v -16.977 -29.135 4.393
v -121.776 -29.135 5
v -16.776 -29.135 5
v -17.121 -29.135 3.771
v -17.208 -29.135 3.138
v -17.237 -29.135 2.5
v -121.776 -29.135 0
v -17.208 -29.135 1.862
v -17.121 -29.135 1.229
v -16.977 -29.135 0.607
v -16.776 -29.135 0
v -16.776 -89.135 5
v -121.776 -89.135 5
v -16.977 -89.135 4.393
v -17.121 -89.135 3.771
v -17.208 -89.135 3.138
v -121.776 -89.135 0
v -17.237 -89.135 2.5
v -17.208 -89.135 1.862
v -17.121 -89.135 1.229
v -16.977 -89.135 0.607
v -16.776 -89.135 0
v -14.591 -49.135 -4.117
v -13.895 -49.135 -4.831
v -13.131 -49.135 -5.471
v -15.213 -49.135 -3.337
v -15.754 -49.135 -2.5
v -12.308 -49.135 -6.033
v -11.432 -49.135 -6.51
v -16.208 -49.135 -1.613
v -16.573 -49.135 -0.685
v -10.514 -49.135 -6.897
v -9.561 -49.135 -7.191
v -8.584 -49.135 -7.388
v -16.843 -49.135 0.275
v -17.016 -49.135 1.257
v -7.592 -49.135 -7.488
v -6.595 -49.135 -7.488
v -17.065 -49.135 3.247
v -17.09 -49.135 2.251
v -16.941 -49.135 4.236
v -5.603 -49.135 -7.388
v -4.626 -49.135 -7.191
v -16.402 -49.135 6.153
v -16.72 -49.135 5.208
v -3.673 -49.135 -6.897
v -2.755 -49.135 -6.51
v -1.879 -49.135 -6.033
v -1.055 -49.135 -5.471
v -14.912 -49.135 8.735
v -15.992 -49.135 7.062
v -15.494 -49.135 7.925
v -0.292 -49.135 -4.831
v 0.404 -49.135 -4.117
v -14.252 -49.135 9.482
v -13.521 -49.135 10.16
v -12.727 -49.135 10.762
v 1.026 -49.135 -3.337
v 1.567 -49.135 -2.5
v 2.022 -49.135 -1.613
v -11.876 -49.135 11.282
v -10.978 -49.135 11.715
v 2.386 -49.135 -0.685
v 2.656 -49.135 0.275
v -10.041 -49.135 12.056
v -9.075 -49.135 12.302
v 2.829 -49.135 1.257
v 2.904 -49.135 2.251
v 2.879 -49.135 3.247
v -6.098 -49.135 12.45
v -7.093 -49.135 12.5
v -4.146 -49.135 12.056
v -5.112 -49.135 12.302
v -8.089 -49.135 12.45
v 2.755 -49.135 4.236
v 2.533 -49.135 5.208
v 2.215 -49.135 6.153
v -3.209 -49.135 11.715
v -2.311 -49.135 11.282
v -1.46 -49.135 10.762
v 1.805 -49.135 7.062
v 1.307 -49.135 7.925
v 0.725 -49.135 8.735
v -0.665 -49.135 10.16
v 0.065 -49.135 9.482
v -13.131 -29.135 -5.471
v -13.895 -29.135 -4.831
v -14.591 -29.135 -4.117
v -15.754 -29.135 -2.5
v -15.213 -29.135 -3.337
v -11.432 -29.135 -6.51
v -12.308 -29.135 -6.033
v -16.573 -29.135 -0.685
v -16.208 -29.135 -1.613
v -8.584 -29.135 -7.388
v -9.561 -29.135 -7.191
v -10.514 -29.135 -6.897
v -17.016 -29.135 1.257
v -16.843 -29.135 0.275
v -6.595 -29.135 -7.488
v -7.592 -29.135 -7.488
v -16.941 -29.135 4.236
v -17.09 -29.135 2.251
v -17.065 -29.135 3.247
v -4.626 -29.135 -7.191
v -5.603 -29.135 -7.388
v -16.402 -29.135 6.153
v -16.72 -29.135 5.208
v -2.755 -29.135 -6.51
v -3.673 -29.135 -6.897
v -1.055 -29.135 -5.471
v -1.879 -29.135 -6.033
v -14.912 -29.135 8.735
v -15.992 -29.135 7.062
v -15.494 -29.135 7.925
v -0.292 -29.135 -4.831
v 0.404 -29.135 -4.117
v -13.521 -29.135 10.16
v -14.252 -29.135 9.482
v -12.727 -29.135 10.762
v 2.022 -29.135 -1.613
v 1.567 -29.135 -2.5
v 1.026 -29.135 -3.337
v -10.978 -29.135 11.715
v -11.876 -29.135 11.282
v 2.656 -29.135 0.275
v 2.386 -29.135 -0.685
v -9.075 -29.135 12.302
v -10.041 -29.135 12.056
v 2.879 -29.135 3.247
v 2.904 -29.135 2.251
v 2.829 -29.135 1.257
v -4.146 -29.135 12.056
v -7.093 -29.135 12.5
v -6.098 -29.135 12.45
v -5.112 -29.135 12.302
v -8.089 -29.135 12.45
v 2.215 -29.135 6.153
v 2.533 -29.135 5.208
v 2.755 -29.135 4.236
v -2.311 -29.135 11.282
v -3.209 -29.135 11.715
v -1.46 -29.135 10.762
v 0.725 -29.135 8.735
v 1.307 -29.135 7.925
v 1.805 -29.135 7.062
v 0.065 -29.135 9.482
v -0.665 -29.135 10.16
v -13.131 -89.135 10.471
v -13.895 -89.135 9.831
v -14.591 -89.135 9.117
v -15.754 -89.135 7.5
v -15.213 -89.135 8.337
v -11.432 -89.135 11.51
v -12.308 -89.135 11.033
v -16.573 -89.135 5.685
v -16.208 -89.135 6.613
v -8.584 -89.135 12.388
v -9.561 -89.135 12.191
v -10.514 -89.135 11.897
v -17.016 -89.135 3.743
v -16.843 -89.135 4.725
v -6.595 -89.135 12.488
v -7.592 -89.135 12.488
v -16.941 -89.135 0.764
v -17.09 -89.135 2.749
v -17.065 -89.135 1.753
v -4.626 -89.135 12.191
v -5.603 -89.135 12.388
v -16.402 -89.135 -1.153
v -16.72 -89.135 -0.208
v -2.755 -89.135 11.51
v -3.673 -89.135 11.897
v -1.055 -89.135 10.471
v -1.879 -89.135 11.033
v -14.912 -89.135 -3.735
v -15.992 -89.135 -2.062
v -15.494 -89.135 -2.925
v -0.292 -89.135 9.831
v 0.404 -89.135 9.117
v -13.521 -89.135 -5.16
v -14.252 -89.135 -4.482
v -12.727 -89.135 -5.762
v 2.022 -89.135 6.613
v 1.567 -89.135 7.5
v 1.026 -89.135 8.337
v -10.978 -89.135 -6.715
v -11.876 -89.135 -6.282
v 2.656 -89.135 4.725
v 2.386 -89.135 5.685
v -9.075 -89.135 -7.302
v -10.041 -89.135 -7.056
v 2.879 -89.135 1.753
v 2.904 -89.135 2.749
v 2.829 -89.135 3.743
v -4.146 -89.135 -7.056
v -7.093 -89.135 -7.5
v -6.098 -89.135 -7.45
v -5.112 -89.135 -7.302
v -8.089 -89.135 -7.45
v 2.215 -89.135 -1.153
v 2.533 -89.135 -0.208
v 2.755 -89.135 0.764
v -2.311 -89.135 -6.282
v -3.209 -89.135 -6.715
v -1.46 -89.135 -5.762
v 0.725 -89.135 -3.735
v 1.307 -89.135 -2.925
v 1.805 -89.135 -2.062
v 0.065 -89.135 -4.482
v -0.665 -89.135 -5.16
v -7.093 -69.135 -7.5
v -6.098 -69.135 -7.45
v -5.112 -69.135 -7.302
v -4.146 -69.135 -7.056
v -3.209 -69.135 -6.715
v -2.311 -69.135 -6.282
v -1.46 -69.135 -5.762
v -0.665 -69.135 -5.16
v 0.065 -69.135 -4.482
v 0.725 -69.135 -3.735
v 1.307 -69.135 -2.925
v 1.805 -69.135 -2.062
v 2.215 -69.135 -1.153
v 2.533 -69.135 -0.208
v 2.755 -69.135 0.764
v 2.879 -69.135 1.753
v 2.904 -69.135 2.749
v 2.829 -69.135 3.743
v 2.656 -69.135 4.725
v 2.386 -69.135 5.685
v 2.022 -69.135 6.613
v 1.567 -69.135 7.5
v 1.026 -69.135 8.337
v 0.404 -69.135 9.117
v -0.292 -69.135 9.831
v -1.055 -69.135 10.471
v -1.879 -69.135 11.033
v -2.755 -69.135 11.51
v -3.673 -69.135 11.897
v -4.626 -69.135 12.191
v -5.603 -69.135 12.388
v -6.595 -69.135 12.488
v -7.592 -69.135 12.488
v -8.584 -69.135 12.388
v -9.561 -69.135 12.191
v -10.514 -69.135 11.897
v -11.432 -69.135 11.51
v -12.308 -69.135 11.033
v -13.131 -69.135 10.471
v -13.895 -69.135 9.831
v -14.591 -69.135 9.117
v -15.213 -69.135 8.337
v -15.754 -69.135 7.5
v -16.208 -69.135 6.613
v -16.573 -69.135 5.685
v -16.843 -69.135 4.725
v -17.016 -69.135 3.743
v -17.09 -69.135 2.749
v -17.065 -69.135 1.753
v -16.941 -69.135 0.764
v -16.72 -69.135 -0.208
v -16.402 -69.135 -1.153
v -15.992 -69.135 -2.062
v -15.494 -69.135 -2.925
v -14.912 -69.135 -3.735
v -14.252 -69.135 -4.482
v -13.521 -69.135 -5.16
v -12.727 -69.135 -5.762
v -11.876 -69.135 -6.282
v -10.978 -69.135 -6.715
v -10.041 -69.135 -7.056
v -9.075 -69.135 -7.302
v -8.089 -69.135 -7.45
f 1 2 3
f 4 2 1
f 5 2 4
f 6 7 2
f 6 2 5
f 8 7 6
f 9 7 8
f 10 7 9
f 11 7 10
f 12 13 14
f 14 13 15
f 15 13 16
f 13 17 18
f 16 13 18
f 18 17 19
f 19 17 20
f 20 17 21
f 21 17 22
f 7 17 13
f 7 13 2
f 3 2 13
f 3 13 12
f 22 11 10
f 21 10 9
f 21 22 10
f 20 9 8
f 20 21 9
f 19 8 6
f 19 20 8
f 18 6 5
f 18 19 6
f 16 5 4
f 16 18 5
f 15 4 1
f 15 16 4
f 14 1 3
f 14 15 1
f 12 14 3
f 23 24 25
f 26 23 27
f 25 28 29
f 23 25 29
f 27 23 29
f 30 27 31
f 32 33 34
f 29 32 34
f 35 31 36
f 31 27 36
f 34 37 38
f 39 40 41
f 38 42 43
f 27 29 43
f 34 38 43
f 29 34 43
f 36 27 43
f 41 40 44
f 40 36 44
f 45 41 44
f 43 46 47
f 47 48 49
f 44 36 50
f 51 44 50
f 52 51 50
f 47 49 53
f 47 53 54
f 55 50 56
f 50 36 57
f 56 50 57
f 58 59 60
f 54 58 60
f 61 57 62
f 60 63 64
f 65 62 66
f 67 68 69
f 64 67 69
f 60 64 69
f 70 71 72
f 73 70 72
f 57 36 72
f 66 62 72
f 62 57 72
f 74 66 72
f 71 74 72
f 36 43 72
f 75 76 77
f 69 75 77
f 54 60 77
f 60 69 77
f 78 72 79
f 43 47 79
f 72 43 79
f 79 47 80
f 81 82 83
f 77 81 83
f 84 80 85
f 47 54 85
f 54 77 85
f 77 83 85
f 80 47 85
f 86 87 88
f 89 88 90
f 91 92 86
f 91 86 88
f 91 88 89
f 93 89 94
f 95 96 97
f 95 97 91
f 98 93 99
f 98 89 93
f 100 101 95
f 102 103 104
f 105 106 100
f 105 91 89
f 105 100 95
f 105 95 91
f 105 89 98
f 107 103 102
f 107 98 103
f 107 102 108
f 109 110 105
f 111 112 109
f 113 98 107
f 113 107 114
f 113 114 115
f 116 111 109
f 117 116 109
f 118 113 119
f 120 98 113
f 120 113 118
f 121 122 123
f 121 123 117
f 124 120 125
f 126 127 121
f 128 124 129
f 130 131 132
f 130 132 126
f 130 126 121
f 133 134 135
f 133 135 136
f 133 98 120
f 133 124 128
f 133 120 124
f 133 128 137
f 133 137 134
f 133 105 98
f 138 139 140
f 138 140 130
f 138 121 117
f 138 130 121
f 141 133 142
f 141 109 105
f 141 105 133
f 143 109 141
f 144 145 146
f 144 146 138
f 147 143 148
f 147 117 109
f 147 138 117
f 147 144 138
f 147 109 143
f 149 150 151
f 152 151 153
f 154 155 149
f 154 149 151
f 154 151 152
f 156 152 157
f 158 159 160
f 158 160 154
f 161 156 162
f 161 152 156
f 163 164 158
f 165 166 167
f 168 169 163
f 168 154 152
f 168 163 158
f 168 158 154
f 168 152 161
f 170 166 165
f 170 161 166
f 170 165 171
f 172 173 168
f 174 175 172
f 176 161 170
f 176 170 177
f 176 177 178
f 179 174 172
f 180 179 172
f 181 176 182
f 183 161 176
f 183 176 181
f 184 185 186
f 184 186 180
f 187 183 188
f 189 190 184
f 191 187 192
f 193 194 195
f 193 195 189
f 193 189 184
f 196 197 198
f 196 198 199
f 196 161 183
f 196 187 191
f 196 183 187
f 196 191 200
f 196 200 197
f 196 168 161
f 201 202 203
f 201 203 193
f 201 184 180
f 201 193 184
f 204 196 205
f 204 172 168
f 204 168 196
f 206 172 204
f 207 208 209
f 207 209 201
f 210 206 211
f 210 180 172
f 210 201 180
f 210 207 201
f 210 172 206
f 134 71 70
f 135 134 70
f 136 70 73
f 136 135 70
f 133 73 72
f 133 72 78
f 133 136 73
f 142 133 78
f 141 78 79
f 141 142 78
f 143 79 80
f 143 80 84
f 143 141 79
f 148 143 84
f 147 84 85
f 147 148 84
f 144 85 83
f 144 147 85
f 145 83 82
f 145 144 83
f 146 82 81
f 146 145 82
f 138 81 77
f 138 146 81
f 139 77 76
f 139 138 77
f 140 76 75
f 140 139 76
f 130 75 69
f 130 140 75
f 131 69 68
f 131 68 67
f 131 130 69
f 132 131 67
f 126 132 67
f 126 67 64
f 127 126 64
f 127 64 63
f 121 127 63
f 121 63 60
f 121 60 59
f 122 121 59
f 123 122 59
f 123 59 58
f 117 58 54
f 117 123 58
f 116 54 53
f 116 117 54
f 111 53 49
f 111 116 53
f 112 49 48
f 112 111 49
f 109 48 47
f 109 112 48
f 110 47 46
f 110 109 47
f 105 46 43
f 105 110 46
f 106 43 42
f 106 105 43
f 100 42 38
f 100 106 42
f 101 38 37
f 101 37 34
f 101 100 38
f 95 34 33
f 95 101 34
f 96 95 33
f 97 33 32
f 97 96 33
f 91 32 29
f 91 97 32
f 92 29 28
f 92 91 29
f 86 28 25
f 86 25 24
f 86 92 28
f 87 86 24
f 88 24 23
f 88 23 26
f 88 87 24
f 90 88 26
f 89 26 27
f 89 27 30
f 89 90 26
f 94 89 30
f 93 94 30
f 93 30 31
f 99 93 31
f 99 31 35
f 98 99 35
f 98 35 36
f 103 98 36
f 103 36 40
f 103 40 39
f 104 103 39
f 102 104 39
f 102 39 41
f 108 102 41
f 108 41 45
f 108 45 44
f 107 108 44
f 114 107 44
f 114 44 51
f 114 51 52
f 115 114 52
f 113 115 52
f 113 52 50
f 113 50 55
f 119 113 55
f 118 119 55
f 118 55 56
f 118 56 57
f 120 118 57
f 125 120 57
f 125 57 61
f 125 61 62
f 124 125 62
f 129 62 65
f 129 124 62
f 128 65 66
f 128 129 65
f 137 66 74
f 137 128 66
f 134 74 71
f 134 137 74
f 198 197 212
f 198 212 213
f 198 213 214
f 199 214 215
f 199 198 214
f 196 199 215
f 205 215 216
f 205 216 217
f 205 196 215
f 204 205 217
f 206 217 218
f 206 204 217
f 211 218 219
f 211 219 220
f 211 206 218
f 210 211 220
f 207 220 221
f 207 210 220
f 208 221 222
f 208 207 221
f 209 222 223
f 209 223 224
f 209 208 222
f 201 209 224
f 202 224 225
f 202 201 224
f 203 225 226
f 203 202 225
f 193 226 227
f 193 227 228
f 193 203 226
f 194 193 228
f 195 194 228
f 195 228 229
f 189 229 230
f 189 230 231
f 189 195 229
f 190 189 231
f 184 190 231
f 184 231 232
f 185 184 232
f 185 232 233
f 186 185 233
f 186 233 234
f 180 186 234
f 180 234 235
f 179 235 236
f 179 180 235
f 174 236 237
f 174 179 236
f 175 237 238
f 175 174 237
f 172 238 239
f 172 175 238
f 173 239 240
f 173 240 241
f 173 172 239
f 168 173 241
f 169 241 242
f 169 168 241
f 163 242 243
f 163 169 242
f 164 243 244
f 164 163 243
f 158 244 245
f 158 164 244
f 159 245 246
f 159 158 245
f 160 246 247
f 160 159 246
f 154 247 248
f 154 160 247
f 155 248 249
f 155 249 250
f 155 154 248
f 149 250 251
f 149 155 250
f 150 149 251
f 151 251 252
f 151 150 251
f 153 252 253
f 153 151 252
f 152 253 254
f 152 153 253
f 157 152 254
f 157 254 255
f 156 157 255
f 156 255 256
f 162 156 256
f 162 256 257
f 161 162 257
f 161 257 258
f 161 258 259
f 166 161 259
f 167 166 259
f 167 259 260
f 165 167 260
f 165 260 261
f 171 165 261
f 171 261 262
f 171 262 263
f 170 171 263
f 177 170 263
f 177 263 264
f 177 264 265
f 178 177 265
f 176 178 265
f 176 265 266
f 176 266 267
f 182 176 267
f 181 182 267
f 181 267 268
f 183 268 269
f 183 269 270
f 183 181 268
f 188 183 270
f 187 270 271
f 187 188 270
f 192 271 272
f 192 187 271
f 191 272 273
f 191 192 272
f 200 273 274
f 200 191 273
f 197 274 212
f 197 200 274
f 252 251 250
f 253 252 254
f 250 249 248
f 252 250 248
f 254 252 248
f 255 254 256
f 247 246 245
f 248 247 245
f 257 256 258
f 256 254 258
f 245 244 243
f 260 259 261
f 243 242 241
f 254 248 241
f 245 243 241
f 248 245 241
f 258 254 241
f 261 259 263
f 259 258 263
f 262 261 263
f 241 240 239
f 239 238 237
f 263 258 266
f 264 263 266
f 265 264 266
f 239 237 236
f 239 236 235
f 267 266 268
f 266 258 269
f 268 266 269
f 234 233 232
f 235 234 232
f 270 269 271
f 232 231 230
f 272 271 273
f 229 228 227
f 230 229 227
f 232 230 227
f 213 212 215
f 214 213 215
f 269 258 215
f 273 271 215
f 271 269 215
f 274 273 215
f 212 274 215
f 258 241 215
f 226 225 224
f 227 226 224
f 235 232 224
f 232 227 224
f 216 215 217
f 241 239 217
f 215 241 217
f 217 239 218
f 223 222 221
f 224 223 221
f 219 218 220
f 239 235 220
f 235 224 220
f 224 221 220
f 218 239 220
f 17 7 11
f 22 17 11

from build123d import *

# Parameters (mm, degrees)
SKETCH1_W               = 120
SKETCH1_H               = 60
BOSS_EXTRUDE4_DEPTH     = 5
CUT_EXTRUDE3_DEPTH      = 150.441021831
CUT_EXTRUDE3_DEPTH_BACK = 60
SKETCH18_R              = 10
BOSS_EXTRUDE9_DEPTH     = 20
SKETCH19_R              = 10
BOSS_EXTRUDE10_DEPTH    = 20
SKETCH20_W              = 15
SKETCH20_H              = 60
CUT_EXTRUDE4_DEPTH      = 10


with BuildPart() as part:
    # Sketch1 → Boss-Extrude4 (new body)
    with BuildSketch(Plane.XY):
        with Locations((-76.775798319, -59.134789916)):
            Rectangle(SKETCH1_W, SKETCH1_H)
    extrude(amount=BOSS_EXTRUDE4_DEPTH)

    # Sketch6 → Cut-Extrude3 (cut, two sides: drawn at the far end of the back side and taken through both)
    with BuildSketch(Plane(origin=(0, -29.134789916, 0), x_dir=(1, 0, 0), z_dir=(0, 1, 0)).offset(-CUT_EXTRUDE3_DEPTH_BACK)):
        with BuildLine():
            Line((72.584288463, 233.706952721), (-16.775798319, 0))
            ThreePointArc((-16.775798319, 0), (-17.237449904, -2.5), (-16.775798319, -5))
            Line((-16.775798319, -5), (72.584288463, -238.706952721))
            Line((72.584288463, -238.706952721), (573.000774441, -238.706952721))
            Line((573.000774441, -238.706952721), (573.000774441, 233.706952721))
            Line((573.000774441, 233.706952721), (72.584288463, 233.706952721))
        make_face()
    extrude(amount=CUT_EXTRUDE3_DEPTH + CUT_EXTRUDE3_DEPTH_BACK, mode=Mode.SUBTRACT)

    # Sketch20 → Cut-Extrude4 (cut)
    with BuildSketch(Plane(origin=(0, 0, 0), x_dir=(-1, 0, 0), z_dir=(0, 0, -1))):
        with Locations((129.275798319, -59.134789916)):
            Rectangle(SKETCH20_W, SKETCH20_H)
    extrude(amount=-CUT_EXTRUDE4_DEPTH, mode=Mode.SUBTRACT)


with BuildPart() as body_2:
    # Sketch18 → Boss-Extrude9 (new body)
    with BuildSketch(Plane(origin=(0, -29.134789916, 0), x_dir=(1, 0, 0), z_dir=(0, 1, 0))):
        with Locations(Location((-7.093339954, -2.5, 0), (0, 0, 270))):
            Circle(SKETCH18_R)
    extrude(amount=-BOSS_EXTRUDE9_DEPTH)


with BuildPart() as body_3:
    # Sketch19 → Boss-Extrude10 (new body)
    with BuildSketch(Plane.XZ.offset(89.134789916)):
        with Locations(Location((-7.093339954, 2.5, 0), (0, 0, 270))):
            Circle(SKETCH19_R)
    extrude(amount=-BOSS_EXTRUDE10_DEPTH)


solid = Compound([part.part, body_2.part, body_3.part])
